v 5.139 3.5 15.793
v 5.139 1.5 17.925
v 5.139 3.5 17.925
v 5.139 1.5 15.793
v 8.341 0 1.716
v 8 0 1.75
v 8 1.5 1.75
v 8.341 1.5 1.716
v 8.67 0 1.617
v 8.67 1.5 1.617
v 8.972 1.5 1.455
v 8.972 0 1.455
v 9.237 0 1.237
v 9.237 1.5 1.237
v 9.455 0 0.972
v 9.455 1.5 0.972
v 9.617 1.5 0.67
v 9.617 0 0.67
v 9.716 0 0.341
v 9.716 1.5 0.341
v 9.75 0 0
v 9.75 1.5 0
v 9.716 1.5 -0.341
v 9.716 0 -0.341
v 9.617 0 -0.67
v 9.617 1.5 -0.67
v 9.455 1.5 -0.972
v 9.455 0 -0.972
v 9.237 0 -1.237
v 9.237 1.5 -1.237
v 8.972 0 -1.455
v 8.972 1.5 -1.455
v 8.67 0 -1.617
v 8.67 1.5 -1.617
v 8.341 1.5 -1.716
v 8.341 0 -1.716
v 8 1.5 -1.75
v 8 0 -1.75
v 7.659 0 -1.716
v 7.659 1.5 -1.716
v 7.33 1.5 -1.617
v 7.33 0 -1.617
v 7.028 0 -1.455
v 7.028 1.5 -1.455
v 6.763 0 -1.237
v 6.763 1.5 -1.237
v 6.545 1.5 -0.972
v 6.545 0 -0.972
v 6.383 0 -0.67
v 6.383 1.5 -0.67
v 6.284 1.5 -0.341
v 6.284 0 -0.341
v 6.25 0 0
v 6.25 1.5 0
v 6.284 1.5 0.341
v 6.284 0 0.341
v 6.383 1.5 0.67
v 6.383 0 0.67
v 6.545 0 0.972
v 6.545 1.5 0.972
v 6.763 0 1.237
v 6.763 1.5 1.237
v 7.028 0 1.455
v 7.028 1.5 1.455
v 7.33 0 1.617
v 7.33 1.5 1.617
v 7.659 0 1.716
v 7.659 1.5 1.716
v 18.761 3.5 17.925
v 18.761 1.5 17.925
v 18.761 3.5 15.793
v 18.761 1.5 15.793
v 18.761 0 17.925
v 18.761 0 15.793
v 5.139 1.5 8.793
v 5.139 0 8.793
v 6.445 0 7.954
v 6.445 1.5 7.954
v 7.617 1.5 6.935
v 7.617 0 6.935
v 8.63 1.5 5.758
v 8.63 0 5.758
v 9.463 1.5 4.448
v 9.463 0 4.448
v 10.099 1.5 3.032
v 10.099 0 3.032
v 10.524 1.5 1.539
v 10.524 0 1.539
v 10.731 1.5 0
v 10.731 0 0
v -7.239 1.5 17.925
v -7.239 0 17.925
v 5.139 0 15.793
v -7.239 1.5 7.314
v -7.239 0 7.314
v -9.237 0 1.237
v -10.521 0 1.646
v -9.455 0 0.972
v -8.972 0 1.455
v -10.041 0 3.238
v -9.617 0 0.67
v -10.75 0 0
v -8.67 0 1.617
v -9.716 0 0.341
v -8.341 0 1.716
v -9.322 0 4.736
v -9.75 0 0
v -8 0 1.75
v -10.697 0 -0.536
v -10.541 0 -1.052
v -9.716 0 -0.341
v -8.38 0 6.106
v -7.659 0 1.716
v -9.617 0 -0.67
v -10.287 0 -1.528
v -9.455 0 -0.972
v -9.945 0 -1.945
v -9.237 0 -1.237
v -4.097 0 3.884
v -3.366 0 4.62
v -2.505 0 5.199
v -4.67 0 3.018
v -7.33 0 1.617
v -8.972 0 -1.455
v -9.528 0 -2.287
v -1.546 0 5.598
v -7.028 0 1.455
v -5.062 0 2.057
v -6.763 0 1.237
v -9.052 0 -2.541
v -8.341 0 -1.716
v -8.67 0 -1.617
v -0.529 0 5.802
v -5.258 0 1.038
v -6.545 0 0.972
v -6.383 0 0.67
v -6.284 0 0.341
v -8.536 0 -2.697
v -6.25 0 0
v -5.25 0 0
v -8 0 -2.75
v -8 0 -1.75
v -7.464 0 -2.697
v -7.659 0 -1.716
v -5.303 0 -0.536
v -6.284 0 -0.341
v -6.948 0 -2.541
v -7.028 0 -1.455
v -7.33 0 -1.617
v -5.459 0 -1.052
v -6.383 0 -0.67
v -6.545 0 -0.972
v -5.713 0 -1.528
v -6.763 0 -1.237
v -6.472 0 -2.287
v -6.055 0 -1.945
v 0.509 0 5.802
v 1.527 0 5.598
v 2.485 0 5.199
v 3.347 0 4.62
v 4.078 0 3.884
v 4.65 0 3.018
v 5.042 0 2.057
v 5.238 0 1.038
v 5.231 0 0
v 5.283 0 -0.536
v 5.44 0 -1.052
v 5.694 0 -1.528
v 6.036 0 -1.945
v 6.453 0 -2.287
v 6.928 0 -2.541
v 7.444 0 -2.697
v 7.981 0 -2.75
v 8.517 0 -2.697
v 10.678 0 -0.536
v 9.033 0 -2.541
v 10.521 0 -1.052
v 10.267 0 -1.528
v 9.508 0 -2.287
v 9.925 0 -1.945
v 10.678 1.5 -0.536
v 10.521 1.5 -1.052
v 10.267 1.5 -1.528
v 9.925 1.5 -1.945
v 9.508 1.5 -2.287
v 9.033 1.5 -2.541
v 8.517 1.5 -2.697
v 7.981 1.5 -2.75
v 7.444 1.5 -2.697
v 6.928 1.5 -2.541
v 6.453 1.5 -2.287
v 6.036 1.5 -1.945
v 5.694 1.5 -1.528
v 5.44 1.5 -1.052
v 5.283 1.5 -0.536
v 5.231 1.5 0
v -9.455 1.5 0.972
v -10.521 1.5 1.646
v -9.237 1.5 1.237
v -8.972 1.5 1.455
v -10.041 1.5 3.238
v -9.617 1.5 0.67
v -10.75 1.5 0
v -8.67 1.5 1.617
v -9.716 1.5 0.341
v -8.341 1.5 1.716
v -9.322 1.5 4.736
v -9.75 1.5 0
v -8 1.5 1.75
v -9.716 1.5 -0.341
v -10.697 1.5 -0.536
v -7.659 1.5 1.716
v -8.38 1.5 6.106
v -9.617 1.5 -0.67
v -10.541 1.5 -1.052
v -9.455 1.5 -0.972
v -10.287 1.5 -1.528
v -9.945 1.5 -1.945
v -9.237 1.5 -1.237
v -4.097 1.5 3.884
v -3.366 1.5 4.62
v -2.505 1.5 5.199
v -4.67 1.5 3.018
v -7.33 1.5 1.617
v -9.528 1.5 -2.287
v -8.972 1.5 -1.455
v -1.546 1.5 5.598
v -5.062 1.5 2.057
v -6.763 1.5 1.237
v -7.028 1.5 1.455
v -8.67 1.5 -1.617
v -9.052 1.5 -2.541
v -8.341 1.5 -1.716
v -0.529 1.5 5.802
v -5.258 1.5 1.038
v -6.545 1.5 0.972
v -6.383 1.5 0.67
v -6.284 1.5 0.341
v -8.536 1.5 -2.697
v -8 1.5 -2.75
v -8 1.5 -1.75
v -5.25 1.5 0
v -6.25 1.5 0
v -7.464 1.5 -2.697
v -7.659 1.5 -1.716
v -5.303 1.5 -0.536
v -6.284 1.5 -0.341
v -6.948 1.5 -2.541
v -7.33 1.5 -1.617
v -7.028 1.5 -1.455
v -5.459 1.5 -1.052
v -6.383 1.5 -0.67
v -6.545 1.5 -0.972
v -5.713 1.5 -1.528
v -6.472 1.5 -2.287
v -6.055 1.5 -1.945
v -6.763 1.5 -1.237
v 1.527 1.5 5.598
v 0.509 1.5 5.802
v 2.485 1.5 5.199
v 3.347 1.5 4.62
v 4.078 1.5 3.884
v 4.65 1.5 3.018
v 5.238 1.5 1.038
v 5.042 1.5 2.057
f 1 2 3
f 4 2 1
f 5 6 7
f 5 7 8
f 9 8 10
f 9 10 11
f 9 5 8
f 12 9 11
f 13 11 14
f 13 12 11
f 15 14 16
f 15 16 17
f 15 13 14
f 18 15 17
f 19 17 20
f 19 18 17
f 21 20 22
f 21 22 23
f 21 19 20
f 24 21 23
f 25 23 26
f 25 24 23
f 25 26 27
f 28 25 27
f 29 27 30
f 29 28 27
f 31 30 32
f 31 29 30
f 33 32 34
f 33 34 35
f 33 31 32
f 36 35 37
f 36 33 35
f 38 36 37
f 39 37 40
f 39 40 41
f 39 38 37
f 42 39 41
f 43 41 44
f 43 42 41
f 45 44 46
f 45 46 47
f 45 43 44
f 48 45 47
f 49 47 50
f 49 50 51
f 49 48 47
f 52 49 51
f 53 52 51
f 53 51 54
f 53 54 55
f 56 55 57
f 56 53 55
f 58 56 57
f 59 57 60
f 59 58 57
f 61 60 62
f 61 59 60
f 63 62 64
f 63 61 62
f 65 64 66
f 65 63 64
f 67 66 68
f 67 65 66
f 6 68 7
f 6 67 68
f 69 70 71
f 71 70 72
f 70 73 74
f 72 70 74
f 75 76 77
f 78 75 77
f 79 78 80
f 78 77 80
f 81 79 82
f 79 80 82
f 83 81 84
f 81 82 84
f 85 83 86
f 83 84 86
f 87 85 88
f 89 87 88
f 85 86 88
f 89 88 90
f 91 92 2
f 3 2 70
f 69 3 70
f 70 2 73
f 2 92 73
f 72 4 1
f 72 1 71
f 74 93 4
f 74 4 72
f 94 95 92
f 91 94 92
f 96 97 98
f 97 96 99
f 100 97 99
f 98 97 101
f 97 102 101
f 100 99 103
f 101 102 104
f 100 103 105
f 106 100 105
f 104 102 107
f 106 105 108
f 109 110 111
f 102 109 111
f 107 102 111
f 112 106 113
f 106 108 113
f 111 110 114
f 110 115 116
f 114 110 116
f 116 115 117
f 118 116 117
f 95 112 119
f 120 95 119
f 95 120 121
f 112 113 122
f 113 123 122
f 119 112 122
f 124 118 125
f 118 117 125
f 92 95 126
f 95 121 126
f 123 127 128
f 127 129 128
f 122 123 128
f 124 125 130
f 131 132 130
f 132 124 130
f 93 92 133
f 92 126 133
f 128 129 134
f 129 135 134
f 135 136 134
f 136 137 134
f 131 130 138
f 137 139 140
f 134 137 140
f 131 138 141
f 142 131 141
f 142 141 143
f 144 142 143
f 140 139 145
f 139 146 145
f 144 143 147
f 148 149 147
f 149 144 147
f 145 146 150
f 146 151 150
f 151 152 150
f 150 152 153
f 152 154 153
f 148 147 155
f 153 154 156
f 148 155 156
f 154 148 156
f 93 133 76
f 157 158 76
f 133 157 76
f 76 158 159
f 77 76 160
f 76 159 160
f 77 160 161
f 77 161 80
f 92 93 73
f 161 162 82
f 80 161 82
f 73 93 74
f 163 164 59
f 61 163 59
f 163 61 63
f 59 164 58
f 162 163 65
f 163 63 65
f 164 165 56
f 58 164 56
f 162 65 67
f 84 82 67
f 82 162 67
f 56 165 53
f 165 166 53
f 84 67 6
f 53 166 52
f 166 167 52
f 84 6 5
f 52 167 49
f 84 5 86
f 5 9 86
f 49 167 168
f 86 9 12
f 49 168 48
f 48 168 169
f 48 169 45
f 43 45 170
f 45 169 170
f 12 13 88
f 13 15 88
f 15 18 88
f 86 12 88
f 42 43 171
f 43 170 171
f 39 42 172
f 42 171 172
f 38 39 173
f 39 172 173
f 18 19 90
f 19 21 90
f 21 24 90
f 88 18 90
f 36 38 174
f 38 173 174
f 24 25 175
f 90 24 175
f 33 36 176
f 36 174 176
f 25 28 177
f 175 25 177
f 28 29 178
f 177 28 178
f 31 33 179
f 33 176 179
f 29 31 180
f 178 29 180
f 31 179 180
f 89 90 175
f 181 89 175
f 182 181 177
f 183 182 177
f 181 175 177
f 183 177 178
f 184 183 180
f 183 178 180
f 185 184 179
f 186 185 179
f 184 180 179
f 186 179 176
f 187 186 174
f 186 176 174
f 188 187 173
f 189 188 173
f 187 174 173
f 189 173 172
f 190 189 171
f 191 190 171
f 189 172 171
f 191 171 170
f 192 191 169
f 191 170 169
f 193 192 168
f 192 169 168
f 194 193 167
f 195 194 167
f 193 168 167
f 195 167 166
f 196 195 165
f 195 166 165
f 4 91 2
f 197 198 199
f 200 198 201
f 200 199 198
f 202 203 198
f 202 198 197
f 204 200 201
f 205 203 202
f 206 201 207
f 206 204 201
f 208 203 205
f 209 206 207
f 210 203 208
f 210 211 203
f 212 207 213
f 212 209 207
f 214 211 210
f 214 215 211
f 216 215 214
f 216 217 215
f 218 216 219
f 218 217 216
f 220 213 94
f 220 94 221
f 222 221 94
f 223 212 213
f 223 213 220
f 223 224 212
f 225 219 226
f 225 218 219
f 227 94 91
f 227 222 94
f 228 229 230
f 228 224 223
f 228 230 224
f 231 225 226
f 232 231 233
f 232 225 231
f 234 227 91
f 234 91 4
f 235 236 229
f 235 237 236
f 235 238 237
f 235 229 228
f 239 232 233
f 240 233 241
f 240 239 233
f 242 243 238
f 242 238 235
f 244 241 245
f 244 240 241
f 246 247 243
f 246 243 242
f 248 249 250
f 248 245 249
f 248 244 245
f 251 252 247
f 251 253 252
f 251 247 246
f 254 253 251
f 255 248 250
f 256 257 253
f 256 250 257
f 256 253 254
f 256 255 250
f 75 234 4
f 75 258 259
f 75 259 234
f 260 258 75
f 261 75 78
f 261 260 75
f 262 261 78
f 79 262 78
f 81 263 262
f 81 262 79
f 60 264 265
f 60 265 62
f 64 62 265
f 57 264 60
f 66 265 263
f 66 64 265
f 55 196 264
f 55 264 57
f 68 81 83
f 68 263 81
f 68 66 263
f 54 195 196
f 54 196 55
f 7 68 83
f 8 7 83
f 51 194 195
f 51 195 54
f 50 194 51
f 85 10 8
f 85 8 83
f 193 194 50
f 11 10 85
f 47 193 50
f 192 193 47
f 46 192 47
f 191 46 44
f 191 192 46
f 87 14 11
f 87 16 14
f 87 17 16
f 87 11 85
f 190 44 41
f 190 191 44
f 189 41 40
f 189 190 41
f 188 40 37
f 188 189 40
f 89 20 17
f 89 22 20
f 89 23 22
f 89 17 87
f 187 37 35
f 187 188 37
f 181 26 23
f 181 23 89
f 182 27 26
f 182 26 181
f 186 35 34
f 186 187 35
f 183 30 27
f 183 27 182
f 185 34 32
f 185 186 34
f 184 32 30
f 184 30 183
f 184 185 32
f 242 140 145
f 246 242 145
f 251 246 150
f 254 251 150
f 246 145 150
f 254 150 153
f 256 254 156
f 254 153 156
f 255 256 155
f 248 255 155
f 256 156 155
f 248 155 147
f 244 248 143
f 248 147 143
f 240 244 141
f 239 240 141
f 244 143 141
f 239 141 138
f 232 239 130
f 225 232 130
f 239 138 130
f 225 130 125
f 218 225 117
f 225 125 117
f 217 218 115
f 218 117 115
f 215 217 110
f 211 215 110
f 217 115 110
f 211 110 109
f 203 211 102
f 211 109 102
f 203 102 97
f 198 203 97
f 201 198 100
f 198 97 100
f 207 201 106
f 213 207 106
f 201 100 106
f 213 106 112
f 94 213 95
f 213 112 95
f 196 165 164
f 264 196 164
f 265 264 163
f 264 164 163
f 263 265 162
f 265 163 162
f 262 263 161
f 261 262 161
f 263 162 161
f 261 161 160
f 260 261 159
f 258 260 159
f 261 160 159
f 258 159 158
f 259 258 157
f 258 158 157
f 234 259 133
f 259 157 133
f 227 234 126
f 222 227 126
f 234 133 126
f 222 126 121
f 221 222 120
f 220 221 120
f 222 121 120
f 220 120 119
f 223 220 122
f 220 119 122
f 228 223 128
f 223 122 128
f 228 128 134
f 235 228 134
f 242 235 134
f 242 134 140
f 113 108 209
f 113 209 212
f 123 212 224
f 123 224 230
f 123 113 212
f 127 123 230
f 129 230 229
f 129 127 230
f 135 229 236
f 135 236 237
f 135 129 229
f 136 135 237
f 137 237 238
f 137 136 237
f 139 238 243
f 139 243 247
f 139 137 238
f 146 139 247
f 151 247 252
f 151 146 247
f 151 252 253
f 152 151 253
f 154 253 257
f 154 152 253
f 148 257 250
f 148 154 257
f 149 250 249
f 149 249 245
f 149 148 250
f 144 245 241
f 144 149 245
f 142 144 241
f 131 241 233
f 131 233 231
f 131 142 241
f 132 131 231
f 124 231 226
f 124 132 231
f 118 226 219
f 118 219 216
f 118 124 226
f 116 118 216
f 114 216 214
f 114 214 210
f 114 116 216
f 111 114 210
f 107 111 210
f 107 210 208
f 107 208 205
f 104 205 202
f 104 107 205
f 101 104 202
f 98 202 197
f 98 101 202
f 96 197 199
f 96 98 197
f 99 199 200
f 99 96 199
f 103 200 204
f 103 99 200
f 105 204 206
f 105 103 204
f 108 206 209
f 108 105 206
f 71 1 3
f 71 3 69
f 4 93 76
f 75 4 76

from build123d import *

# Parameters (mm, degrees)
SKETCH_1_R      = 1.75
EXTRUDE_1_DEPTH = 1.5
SKETCH_2_W      = 13.622112507
SKETCH_2_H      = 2.131934571
EXTRUDE_2_DEPTH = 2


with BuildPart() as part:
    # 草图1 → 凸台-拉伸1 (new body)
    with BuildSketch(Plane(origin=(0, 0, 0), x_dir=(1, 0, 0), z_dir=(0, 1, 0))):
        with BuildLine():
            Line((-7.23910046, -7.314129875), (-7.23910046, -17.924733935))
            Line((-7.23910046, -17.924733935), (18.76089954, -17.924733935))
            Line((18.76089954, -17.924733935), (18.76089954, -15.792799364))
            Line((18.76089954, -15.792799364), (5.138787033, -15.792799364))
            Line((5.138787033, -15.792799364), (5.138787033, -8.792799364))
            ThreePointArc((5.138787033, -8.792799364), (9.069997492, -5.118417293), (10.730510575, 0))
            ThreePointArc((10.730510575, 0), (7.980510575, 2.75), (5.230510575, 0))
            ThreePointArc((5.230510575, 0), (-0.009744712, -5.827408606), (-5.25, 0))
            ThreePointArc((-5.25, 0), (-8, 2.75), (-10.75, 0))
            ThreePointArc((-10.75, 0), (-9.710304188, -4.000638307), (-7.23910046, -7.314129875))
        make_face()
        with Locations(Location((-8, 0, 0), (0, 0, 270))):
            Circle(SKETCH_1_R, mode=Mode.SUBTRACT)
        with Locations(Location((8, 0, 0), (0, 0, 270))):
            Circle(SKETCH_1_R, mode=Mode.SUBTRACT)
    extrude(amount=EXTRUDE_1_DEPTH)

    # 草图2 → 凸台-拉伸2 (add)
    with BuildSketch(Plane(origin=(0, 1.5, 0), x_dir=(1, 0, 0), z_dir=(0, 1, 0))):
        with Locations((11.949843287, -16.85876665)):
            Rectangle(SKETCH_2_W, SKETCH_2_H)
    extrude(amount=EXTRUDE_2_DEPTH)


solid = part.part
